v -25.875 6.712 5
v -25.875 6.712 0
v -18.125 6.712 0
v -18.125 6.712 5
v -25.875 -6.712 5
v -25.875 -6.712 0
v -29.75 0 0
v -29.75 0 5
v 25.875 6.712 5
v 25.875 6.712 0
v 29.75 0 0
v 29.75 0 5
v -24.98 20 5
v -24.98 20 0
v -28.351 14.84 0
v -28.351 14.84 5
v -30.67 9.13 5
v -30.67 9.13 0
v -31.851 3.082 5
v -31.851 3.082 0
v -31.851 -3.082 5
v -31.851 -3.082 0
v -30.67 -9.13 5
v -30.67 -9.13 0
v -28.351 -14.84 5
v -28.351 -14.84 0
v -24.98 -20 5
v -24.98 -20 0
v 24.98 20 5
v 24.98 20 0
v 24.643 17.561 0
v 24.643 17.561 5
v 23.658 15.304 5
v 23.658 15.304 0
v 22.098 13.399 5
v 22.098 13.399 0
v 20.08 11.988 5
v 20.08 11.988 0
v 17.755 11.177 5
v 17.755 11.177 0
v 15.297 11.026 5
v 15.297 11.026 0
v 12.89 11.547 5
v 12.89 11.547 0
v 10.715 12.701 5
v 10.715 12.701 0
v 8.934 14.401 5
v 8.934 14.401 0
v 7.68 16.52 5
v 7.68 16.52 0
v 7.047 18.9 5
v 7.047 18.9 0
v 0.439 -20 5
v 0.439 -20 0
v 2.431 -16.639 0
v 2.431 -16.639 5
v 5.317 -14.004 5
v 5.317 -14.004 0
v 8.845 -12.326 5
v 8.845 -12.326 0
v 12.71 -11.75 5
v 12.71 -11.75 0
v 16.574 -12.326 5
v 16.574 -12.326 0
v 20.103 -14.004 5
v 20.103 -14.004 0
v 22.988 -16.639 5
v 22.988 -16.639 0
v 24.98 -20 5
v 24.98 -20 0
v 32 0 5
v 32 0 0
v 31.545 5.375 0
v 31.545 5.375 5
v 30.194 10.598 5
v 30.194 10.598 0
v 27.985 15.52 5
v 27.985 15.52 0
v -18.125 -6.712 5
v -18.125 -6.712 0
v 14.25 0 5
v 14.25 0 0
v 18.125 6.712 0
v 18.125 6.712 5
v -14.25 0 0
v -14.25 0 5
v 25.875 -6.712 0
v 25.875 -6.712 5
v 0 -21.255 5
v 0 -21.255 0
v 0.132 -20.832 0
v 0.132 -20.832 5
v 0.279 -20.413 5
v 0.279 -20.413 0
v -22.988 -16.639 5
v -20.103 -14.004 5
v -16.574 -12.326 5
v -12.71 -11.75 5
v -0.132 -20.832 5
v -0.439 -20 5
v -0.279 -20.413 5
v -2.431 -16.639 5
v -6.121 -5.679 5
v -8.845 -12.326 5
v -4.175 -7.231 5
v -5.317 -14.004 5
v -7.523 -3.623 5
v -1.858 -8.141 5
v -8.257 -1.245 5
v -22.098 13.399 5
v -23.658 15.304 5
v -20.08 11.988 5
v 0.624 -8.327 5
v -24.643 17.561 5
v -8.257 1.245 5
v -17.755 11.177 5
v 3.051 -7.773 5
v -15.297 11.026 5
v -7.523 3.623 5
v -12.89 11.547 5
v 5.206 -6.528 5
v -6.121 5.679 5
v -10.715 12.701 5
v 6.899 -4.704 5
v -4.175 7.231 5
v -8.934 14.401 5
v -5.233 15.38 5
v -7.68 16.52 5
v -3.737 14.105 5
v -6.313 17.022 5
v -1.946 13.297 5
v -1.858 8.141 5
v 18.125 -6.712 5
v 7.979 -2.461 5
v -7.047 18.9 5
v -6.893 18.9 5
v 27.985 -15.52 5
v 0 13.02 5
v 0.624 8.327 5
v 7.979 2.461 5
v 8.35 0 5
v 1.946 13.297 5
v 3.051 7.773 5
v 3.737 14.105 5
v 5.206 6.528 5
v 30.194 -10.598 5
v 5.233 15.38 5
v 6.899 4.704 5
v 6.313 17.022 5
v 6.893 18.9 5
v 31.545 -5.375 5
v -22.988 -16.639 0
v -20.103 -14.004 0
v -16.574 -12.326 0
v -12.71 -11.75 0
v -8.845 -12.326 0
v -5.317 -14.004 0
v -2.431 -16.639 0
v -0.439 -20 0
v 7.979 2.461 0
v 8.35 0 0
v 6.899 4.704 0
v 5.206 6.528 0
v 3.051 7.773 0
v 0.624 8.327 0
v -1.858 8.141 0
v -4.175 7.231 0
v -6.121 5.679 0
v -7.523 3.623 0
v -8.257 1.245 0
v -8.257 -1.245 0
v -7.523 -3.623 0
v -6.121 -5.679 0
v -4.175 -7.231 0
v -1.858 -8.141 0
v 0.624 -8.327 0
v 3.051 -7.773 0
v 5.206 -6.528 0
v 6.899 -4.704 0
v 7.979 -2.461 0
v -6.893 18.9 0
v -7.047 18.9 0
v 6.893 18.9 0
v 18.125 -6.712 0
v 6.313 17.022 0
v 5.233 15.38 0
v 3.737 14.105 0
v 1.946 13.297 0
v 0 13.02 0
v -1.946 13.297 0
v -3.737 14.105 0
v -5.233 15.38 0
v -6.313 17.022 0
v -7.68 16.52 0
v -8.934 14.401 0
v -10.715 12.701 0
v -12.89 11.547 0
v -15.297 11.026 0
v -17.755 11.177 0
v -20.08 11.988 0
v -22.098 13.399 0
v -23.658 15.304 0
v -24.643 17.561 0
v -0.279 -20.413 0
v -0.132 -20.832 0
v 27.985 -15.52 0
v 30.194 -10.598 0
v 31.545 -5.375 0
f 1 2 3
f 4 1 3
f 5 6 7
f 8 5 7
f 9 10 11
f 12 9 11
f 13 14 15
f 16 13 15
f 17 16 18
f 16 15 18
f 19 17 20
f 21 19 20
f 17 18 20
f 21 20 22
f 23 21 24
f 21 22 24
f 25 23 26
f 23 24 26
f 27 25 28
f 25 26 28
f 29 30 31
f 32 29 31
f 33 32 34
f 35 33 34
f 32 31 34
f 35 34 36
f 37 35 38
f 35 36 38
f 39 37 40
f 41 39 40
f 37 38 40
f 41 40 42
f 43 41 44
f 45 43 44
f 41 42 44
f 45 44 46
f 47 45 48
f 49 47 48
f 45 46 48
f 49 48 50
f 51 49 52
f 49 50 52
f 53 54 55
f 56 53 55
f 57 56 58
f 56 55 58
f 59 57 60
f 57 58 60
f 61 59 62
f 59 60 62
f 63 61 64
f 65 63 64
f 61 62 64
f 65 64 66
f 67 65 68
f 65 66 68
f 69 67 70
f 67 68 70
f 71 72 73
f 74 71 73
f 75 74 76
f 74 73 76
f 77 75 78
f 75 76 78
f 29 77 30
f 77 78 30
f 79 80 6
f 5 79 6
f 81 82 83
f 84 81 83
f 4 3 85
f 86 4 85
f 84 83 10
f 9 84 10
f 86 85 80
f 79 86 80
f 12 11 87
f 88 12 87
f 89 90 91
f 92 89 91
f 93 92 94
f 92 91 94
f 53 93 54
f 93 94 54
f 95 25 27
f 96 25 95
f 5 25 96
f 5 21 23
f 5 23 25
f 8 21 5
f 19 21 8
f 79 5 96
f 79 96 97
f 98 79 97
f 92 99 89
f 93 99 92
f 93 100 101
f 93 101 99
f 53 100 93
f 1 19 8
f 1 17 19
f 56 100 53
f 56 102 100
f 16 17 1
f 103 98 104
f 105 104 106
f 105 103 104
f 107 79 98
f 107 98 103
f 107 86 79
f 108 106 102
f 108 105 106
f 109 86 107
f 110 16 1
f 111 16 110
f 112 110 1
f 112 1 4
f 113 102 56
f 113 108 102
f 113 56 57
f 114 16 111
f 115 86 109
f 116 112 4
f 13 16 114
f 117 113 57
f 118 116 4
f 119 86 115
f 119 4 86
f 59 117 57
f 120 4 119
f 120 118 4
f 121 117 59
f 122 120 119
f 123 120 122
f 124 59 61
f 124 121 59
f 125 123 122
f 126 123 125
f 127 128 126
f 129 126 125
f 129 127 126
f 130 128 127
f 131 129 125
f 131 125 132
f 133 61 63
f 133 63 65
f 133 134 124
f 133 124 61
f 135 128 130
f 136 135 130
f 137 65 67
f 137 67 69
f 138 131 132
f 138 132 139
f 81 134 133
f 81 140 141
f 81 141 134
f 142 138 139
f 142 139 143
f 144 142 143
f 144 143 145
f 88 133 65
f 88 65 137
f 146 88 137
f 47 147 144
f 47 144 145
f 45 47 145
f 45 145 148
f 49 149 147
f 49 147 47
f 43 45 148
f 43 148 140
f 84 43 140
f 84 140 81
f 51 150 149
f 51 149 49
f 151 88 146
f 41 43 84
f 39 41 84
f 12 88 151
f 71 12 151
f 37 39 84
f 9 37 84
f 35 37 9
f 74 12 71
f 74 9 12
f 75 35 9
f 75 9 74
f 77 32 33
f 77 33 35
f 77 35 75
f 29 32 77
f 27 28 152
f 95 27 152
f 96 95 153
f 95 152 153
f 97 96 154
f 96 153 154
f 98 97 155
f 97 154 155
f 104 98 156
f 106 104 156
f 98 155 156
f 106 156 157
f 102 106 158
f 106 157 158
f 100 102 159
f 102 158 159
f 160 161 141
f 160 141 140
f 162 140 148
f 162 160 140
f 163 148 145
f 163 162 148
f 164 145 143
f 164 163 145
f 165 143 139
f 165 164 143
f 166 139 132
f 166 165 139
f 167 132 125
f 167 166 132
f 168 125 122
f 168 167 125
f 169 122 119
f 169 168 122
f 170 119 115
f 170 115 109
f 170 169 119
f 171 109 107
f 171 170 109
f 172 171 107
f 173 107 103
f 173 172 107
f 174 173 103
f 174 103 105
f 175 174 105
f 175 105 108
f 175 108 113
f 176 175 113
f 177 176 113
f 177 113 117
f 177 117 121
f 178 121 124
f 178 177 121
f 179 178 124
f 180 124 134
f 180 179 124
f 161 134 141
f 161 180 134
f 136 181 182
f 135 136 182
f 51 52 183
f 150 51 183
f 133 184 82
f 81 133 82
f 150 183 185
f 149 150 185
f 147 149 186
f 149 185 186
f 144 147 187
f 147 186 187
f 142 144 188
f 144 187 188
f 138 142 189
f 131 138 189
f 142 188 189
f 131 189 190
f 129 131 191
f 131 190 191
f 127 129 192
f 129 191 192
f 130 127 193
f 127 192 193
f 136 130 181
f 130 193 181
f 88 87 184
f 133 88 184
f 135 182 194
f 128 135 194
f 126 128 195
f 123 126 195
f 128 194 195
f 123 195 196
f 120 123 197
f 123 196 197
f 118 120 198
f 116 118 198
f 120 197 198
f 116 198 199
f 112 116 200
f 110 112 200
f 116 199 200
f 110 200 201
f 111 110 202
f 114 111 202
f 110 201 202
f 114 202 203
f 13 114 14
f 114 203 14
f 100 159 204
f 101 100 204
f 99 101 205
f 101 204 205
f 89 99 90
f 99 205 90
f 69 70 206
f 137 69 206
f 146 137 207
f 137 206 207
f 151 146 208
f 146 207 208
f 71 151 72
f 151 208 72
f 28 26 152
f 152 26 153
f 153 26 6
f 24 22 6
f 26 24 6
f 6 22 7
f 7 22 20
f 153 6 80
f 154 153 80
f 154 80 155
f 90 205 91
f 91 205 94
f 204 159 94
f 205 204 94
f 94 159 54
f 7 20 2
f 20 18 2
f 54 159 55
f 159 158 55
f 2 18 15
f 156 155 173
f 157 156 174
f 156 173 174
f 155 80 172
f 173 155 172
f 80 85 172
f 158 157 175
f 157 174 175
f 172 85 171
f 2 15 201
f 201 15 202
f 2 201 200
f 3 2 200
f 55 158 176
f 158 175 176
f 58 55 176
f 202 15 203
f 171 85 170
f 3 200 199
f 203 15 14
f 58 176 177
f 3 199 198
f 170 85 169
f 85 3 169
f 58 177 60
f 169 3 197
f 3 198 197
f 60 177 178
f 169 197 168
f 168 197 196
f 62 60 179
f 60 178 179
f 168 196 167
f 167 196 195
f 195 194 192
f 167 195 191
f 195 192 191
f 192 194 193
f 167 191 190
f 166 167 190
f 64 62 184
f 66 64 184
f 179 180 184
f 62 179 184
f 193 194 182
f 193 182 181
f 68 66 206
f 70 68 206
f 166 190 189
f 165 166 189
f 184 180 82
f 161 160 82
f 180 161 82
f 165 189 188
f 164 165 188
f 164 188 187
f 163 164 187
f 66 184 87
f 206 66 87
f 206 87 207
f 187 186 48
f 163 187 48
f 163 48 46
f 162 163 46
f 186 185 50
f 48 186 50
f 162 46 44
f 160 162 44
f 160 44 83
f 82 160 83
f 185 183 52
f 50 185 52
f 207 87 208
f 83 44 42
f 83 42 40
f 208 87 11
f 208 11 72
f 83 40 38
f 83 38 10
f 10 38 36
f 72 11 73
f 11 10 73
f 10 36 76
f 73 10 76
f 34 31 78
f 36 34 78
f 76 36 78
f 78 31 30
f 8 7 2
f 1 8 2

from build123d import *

# Parameters (mm, degrees)
F0_R     = 8.35
F1_DEPTH = 5


with BuildPart() as f1:
    # F0 (on Top) → F1 (new body)
    with BuildSketch(Plane.XY):
        with BuildLine():
            ThreePointArc((24.9799919936, -20), (30.1940370255, -10.5981190832), (32, 0))
            ThreePointArc((32, 0), (30.1940370255, 10.5981190832), (24.9799919936, 20))
            Line((24.9799919936, 20), (24.9799919936, 6.7116968793))
            Line((24.9799919936, 6.7116968793), (25.875, 6.7116968793))
            Line((25.875, 6.7116968793), (29.75, 0))
            Line((29.75, 0), (25.875, -6.7116968793))
            Line((25.875, -6.7116968793), (24.9799919936, -6.7116968793))
            Line((24.9799919936, -6.7116968793), (24.9799919936, -20))
        make_face()
        with BuildLine():
            Line((24.9799919936, 6.7116968793), (24.9799919936, 20))
            ThreePointArc((24.9799919936, 20), (16.5310257714, 11.0168846286), (7.0474671546, 18.9))
            Line((7.0474671546, 18.9), (6.8927707223, 18.9))
            ThreePointArc((6.8927707223, 18.9), (0, 13.0200080064), (-6.8927707223, 18.9))
            Line((-6.8927707223, 18.9), (-7.0474671546, 18.9))
            ThreePointArc((-7.0474671546, 18.9), (-16.5310257714, 11.0168846286), (-24.9799919936, 20))
            Line((-24.9799919936, 20), (-24.9799919936, 6.7116968793))
            Line((-24.9799919936, 6.7116968793), (-18.125, 6.7116968793))
            Line((-18.125, 6.7116968793), (-14.25, 0))
            Line((-14.25, 0), (-18.125, -6.7116968793))
            Line((-18.125, -6.7116968793), (-24.9799919936, -6.7116968793))
            Line((-24.9799919936, -6.7116968793), (-24.9799919936, -20))
            ThreePointArc((-24.9799919936, -20), (-12.7096008018, -11.75), (-0.43920961, -20))
            Line((-0.43920961, -20), (0.43920961, -20))
            ThreePointArc((0.43920961, -20), (12.7096008018, -11.75), (24.9799919936, -20))
            Line((24.9799919936, -20), (24.9799919936, -6.7116968793))
            Line((24.9799919936, -6.7116968793), (18.125, -6.7116968793))
            Line((18.125, -6.7116968793), (14.25, 0))
            Line((14.25, 0), (18.125, 6.7116968793))
            Line((18.125, 6.7116968793), (24.9799919936, 6.7116968793))
        make_face()
        Circle(F0_R, mode=Mode.SUBTRACT)
        with BuildLine():
            ThreePointArc((0, -21.2545297412), (0.2038636697, -20.6217539149), (0.43920961, -20))
            Line((0.43920961, -20), (-0.43920961, -20))
            ThreePointArc((-0.43920961, -20), (-0.2038636697, -20.6217539149), (0, -21.2545297412))
        make_face()
        with BuildLine():
            Line((-24.9799919936, 6.7116968793), (-24.9799919936, 20))
            ThreePointArc((-24.9799919936, 20), (-32, 0), (-24.9799919936, -20))
            Line((-24.9799919936, -20), (-24.9799919936, -6.7116968793))
            Line((-24.9799919936, -6.7116968793), (-25.875, -6.7116968793))
            Line((-25.875, -6.7116968793), (-29.75, 0))
            Line((-29.75, 0), (-25.875, 6.7116968793))
            Line((-25.875, 6.7116968793), (-24.9799919936, 6.7116968793))
        make_face()
    extrude(amount=F1_DEPTH)


solid = f1.part
